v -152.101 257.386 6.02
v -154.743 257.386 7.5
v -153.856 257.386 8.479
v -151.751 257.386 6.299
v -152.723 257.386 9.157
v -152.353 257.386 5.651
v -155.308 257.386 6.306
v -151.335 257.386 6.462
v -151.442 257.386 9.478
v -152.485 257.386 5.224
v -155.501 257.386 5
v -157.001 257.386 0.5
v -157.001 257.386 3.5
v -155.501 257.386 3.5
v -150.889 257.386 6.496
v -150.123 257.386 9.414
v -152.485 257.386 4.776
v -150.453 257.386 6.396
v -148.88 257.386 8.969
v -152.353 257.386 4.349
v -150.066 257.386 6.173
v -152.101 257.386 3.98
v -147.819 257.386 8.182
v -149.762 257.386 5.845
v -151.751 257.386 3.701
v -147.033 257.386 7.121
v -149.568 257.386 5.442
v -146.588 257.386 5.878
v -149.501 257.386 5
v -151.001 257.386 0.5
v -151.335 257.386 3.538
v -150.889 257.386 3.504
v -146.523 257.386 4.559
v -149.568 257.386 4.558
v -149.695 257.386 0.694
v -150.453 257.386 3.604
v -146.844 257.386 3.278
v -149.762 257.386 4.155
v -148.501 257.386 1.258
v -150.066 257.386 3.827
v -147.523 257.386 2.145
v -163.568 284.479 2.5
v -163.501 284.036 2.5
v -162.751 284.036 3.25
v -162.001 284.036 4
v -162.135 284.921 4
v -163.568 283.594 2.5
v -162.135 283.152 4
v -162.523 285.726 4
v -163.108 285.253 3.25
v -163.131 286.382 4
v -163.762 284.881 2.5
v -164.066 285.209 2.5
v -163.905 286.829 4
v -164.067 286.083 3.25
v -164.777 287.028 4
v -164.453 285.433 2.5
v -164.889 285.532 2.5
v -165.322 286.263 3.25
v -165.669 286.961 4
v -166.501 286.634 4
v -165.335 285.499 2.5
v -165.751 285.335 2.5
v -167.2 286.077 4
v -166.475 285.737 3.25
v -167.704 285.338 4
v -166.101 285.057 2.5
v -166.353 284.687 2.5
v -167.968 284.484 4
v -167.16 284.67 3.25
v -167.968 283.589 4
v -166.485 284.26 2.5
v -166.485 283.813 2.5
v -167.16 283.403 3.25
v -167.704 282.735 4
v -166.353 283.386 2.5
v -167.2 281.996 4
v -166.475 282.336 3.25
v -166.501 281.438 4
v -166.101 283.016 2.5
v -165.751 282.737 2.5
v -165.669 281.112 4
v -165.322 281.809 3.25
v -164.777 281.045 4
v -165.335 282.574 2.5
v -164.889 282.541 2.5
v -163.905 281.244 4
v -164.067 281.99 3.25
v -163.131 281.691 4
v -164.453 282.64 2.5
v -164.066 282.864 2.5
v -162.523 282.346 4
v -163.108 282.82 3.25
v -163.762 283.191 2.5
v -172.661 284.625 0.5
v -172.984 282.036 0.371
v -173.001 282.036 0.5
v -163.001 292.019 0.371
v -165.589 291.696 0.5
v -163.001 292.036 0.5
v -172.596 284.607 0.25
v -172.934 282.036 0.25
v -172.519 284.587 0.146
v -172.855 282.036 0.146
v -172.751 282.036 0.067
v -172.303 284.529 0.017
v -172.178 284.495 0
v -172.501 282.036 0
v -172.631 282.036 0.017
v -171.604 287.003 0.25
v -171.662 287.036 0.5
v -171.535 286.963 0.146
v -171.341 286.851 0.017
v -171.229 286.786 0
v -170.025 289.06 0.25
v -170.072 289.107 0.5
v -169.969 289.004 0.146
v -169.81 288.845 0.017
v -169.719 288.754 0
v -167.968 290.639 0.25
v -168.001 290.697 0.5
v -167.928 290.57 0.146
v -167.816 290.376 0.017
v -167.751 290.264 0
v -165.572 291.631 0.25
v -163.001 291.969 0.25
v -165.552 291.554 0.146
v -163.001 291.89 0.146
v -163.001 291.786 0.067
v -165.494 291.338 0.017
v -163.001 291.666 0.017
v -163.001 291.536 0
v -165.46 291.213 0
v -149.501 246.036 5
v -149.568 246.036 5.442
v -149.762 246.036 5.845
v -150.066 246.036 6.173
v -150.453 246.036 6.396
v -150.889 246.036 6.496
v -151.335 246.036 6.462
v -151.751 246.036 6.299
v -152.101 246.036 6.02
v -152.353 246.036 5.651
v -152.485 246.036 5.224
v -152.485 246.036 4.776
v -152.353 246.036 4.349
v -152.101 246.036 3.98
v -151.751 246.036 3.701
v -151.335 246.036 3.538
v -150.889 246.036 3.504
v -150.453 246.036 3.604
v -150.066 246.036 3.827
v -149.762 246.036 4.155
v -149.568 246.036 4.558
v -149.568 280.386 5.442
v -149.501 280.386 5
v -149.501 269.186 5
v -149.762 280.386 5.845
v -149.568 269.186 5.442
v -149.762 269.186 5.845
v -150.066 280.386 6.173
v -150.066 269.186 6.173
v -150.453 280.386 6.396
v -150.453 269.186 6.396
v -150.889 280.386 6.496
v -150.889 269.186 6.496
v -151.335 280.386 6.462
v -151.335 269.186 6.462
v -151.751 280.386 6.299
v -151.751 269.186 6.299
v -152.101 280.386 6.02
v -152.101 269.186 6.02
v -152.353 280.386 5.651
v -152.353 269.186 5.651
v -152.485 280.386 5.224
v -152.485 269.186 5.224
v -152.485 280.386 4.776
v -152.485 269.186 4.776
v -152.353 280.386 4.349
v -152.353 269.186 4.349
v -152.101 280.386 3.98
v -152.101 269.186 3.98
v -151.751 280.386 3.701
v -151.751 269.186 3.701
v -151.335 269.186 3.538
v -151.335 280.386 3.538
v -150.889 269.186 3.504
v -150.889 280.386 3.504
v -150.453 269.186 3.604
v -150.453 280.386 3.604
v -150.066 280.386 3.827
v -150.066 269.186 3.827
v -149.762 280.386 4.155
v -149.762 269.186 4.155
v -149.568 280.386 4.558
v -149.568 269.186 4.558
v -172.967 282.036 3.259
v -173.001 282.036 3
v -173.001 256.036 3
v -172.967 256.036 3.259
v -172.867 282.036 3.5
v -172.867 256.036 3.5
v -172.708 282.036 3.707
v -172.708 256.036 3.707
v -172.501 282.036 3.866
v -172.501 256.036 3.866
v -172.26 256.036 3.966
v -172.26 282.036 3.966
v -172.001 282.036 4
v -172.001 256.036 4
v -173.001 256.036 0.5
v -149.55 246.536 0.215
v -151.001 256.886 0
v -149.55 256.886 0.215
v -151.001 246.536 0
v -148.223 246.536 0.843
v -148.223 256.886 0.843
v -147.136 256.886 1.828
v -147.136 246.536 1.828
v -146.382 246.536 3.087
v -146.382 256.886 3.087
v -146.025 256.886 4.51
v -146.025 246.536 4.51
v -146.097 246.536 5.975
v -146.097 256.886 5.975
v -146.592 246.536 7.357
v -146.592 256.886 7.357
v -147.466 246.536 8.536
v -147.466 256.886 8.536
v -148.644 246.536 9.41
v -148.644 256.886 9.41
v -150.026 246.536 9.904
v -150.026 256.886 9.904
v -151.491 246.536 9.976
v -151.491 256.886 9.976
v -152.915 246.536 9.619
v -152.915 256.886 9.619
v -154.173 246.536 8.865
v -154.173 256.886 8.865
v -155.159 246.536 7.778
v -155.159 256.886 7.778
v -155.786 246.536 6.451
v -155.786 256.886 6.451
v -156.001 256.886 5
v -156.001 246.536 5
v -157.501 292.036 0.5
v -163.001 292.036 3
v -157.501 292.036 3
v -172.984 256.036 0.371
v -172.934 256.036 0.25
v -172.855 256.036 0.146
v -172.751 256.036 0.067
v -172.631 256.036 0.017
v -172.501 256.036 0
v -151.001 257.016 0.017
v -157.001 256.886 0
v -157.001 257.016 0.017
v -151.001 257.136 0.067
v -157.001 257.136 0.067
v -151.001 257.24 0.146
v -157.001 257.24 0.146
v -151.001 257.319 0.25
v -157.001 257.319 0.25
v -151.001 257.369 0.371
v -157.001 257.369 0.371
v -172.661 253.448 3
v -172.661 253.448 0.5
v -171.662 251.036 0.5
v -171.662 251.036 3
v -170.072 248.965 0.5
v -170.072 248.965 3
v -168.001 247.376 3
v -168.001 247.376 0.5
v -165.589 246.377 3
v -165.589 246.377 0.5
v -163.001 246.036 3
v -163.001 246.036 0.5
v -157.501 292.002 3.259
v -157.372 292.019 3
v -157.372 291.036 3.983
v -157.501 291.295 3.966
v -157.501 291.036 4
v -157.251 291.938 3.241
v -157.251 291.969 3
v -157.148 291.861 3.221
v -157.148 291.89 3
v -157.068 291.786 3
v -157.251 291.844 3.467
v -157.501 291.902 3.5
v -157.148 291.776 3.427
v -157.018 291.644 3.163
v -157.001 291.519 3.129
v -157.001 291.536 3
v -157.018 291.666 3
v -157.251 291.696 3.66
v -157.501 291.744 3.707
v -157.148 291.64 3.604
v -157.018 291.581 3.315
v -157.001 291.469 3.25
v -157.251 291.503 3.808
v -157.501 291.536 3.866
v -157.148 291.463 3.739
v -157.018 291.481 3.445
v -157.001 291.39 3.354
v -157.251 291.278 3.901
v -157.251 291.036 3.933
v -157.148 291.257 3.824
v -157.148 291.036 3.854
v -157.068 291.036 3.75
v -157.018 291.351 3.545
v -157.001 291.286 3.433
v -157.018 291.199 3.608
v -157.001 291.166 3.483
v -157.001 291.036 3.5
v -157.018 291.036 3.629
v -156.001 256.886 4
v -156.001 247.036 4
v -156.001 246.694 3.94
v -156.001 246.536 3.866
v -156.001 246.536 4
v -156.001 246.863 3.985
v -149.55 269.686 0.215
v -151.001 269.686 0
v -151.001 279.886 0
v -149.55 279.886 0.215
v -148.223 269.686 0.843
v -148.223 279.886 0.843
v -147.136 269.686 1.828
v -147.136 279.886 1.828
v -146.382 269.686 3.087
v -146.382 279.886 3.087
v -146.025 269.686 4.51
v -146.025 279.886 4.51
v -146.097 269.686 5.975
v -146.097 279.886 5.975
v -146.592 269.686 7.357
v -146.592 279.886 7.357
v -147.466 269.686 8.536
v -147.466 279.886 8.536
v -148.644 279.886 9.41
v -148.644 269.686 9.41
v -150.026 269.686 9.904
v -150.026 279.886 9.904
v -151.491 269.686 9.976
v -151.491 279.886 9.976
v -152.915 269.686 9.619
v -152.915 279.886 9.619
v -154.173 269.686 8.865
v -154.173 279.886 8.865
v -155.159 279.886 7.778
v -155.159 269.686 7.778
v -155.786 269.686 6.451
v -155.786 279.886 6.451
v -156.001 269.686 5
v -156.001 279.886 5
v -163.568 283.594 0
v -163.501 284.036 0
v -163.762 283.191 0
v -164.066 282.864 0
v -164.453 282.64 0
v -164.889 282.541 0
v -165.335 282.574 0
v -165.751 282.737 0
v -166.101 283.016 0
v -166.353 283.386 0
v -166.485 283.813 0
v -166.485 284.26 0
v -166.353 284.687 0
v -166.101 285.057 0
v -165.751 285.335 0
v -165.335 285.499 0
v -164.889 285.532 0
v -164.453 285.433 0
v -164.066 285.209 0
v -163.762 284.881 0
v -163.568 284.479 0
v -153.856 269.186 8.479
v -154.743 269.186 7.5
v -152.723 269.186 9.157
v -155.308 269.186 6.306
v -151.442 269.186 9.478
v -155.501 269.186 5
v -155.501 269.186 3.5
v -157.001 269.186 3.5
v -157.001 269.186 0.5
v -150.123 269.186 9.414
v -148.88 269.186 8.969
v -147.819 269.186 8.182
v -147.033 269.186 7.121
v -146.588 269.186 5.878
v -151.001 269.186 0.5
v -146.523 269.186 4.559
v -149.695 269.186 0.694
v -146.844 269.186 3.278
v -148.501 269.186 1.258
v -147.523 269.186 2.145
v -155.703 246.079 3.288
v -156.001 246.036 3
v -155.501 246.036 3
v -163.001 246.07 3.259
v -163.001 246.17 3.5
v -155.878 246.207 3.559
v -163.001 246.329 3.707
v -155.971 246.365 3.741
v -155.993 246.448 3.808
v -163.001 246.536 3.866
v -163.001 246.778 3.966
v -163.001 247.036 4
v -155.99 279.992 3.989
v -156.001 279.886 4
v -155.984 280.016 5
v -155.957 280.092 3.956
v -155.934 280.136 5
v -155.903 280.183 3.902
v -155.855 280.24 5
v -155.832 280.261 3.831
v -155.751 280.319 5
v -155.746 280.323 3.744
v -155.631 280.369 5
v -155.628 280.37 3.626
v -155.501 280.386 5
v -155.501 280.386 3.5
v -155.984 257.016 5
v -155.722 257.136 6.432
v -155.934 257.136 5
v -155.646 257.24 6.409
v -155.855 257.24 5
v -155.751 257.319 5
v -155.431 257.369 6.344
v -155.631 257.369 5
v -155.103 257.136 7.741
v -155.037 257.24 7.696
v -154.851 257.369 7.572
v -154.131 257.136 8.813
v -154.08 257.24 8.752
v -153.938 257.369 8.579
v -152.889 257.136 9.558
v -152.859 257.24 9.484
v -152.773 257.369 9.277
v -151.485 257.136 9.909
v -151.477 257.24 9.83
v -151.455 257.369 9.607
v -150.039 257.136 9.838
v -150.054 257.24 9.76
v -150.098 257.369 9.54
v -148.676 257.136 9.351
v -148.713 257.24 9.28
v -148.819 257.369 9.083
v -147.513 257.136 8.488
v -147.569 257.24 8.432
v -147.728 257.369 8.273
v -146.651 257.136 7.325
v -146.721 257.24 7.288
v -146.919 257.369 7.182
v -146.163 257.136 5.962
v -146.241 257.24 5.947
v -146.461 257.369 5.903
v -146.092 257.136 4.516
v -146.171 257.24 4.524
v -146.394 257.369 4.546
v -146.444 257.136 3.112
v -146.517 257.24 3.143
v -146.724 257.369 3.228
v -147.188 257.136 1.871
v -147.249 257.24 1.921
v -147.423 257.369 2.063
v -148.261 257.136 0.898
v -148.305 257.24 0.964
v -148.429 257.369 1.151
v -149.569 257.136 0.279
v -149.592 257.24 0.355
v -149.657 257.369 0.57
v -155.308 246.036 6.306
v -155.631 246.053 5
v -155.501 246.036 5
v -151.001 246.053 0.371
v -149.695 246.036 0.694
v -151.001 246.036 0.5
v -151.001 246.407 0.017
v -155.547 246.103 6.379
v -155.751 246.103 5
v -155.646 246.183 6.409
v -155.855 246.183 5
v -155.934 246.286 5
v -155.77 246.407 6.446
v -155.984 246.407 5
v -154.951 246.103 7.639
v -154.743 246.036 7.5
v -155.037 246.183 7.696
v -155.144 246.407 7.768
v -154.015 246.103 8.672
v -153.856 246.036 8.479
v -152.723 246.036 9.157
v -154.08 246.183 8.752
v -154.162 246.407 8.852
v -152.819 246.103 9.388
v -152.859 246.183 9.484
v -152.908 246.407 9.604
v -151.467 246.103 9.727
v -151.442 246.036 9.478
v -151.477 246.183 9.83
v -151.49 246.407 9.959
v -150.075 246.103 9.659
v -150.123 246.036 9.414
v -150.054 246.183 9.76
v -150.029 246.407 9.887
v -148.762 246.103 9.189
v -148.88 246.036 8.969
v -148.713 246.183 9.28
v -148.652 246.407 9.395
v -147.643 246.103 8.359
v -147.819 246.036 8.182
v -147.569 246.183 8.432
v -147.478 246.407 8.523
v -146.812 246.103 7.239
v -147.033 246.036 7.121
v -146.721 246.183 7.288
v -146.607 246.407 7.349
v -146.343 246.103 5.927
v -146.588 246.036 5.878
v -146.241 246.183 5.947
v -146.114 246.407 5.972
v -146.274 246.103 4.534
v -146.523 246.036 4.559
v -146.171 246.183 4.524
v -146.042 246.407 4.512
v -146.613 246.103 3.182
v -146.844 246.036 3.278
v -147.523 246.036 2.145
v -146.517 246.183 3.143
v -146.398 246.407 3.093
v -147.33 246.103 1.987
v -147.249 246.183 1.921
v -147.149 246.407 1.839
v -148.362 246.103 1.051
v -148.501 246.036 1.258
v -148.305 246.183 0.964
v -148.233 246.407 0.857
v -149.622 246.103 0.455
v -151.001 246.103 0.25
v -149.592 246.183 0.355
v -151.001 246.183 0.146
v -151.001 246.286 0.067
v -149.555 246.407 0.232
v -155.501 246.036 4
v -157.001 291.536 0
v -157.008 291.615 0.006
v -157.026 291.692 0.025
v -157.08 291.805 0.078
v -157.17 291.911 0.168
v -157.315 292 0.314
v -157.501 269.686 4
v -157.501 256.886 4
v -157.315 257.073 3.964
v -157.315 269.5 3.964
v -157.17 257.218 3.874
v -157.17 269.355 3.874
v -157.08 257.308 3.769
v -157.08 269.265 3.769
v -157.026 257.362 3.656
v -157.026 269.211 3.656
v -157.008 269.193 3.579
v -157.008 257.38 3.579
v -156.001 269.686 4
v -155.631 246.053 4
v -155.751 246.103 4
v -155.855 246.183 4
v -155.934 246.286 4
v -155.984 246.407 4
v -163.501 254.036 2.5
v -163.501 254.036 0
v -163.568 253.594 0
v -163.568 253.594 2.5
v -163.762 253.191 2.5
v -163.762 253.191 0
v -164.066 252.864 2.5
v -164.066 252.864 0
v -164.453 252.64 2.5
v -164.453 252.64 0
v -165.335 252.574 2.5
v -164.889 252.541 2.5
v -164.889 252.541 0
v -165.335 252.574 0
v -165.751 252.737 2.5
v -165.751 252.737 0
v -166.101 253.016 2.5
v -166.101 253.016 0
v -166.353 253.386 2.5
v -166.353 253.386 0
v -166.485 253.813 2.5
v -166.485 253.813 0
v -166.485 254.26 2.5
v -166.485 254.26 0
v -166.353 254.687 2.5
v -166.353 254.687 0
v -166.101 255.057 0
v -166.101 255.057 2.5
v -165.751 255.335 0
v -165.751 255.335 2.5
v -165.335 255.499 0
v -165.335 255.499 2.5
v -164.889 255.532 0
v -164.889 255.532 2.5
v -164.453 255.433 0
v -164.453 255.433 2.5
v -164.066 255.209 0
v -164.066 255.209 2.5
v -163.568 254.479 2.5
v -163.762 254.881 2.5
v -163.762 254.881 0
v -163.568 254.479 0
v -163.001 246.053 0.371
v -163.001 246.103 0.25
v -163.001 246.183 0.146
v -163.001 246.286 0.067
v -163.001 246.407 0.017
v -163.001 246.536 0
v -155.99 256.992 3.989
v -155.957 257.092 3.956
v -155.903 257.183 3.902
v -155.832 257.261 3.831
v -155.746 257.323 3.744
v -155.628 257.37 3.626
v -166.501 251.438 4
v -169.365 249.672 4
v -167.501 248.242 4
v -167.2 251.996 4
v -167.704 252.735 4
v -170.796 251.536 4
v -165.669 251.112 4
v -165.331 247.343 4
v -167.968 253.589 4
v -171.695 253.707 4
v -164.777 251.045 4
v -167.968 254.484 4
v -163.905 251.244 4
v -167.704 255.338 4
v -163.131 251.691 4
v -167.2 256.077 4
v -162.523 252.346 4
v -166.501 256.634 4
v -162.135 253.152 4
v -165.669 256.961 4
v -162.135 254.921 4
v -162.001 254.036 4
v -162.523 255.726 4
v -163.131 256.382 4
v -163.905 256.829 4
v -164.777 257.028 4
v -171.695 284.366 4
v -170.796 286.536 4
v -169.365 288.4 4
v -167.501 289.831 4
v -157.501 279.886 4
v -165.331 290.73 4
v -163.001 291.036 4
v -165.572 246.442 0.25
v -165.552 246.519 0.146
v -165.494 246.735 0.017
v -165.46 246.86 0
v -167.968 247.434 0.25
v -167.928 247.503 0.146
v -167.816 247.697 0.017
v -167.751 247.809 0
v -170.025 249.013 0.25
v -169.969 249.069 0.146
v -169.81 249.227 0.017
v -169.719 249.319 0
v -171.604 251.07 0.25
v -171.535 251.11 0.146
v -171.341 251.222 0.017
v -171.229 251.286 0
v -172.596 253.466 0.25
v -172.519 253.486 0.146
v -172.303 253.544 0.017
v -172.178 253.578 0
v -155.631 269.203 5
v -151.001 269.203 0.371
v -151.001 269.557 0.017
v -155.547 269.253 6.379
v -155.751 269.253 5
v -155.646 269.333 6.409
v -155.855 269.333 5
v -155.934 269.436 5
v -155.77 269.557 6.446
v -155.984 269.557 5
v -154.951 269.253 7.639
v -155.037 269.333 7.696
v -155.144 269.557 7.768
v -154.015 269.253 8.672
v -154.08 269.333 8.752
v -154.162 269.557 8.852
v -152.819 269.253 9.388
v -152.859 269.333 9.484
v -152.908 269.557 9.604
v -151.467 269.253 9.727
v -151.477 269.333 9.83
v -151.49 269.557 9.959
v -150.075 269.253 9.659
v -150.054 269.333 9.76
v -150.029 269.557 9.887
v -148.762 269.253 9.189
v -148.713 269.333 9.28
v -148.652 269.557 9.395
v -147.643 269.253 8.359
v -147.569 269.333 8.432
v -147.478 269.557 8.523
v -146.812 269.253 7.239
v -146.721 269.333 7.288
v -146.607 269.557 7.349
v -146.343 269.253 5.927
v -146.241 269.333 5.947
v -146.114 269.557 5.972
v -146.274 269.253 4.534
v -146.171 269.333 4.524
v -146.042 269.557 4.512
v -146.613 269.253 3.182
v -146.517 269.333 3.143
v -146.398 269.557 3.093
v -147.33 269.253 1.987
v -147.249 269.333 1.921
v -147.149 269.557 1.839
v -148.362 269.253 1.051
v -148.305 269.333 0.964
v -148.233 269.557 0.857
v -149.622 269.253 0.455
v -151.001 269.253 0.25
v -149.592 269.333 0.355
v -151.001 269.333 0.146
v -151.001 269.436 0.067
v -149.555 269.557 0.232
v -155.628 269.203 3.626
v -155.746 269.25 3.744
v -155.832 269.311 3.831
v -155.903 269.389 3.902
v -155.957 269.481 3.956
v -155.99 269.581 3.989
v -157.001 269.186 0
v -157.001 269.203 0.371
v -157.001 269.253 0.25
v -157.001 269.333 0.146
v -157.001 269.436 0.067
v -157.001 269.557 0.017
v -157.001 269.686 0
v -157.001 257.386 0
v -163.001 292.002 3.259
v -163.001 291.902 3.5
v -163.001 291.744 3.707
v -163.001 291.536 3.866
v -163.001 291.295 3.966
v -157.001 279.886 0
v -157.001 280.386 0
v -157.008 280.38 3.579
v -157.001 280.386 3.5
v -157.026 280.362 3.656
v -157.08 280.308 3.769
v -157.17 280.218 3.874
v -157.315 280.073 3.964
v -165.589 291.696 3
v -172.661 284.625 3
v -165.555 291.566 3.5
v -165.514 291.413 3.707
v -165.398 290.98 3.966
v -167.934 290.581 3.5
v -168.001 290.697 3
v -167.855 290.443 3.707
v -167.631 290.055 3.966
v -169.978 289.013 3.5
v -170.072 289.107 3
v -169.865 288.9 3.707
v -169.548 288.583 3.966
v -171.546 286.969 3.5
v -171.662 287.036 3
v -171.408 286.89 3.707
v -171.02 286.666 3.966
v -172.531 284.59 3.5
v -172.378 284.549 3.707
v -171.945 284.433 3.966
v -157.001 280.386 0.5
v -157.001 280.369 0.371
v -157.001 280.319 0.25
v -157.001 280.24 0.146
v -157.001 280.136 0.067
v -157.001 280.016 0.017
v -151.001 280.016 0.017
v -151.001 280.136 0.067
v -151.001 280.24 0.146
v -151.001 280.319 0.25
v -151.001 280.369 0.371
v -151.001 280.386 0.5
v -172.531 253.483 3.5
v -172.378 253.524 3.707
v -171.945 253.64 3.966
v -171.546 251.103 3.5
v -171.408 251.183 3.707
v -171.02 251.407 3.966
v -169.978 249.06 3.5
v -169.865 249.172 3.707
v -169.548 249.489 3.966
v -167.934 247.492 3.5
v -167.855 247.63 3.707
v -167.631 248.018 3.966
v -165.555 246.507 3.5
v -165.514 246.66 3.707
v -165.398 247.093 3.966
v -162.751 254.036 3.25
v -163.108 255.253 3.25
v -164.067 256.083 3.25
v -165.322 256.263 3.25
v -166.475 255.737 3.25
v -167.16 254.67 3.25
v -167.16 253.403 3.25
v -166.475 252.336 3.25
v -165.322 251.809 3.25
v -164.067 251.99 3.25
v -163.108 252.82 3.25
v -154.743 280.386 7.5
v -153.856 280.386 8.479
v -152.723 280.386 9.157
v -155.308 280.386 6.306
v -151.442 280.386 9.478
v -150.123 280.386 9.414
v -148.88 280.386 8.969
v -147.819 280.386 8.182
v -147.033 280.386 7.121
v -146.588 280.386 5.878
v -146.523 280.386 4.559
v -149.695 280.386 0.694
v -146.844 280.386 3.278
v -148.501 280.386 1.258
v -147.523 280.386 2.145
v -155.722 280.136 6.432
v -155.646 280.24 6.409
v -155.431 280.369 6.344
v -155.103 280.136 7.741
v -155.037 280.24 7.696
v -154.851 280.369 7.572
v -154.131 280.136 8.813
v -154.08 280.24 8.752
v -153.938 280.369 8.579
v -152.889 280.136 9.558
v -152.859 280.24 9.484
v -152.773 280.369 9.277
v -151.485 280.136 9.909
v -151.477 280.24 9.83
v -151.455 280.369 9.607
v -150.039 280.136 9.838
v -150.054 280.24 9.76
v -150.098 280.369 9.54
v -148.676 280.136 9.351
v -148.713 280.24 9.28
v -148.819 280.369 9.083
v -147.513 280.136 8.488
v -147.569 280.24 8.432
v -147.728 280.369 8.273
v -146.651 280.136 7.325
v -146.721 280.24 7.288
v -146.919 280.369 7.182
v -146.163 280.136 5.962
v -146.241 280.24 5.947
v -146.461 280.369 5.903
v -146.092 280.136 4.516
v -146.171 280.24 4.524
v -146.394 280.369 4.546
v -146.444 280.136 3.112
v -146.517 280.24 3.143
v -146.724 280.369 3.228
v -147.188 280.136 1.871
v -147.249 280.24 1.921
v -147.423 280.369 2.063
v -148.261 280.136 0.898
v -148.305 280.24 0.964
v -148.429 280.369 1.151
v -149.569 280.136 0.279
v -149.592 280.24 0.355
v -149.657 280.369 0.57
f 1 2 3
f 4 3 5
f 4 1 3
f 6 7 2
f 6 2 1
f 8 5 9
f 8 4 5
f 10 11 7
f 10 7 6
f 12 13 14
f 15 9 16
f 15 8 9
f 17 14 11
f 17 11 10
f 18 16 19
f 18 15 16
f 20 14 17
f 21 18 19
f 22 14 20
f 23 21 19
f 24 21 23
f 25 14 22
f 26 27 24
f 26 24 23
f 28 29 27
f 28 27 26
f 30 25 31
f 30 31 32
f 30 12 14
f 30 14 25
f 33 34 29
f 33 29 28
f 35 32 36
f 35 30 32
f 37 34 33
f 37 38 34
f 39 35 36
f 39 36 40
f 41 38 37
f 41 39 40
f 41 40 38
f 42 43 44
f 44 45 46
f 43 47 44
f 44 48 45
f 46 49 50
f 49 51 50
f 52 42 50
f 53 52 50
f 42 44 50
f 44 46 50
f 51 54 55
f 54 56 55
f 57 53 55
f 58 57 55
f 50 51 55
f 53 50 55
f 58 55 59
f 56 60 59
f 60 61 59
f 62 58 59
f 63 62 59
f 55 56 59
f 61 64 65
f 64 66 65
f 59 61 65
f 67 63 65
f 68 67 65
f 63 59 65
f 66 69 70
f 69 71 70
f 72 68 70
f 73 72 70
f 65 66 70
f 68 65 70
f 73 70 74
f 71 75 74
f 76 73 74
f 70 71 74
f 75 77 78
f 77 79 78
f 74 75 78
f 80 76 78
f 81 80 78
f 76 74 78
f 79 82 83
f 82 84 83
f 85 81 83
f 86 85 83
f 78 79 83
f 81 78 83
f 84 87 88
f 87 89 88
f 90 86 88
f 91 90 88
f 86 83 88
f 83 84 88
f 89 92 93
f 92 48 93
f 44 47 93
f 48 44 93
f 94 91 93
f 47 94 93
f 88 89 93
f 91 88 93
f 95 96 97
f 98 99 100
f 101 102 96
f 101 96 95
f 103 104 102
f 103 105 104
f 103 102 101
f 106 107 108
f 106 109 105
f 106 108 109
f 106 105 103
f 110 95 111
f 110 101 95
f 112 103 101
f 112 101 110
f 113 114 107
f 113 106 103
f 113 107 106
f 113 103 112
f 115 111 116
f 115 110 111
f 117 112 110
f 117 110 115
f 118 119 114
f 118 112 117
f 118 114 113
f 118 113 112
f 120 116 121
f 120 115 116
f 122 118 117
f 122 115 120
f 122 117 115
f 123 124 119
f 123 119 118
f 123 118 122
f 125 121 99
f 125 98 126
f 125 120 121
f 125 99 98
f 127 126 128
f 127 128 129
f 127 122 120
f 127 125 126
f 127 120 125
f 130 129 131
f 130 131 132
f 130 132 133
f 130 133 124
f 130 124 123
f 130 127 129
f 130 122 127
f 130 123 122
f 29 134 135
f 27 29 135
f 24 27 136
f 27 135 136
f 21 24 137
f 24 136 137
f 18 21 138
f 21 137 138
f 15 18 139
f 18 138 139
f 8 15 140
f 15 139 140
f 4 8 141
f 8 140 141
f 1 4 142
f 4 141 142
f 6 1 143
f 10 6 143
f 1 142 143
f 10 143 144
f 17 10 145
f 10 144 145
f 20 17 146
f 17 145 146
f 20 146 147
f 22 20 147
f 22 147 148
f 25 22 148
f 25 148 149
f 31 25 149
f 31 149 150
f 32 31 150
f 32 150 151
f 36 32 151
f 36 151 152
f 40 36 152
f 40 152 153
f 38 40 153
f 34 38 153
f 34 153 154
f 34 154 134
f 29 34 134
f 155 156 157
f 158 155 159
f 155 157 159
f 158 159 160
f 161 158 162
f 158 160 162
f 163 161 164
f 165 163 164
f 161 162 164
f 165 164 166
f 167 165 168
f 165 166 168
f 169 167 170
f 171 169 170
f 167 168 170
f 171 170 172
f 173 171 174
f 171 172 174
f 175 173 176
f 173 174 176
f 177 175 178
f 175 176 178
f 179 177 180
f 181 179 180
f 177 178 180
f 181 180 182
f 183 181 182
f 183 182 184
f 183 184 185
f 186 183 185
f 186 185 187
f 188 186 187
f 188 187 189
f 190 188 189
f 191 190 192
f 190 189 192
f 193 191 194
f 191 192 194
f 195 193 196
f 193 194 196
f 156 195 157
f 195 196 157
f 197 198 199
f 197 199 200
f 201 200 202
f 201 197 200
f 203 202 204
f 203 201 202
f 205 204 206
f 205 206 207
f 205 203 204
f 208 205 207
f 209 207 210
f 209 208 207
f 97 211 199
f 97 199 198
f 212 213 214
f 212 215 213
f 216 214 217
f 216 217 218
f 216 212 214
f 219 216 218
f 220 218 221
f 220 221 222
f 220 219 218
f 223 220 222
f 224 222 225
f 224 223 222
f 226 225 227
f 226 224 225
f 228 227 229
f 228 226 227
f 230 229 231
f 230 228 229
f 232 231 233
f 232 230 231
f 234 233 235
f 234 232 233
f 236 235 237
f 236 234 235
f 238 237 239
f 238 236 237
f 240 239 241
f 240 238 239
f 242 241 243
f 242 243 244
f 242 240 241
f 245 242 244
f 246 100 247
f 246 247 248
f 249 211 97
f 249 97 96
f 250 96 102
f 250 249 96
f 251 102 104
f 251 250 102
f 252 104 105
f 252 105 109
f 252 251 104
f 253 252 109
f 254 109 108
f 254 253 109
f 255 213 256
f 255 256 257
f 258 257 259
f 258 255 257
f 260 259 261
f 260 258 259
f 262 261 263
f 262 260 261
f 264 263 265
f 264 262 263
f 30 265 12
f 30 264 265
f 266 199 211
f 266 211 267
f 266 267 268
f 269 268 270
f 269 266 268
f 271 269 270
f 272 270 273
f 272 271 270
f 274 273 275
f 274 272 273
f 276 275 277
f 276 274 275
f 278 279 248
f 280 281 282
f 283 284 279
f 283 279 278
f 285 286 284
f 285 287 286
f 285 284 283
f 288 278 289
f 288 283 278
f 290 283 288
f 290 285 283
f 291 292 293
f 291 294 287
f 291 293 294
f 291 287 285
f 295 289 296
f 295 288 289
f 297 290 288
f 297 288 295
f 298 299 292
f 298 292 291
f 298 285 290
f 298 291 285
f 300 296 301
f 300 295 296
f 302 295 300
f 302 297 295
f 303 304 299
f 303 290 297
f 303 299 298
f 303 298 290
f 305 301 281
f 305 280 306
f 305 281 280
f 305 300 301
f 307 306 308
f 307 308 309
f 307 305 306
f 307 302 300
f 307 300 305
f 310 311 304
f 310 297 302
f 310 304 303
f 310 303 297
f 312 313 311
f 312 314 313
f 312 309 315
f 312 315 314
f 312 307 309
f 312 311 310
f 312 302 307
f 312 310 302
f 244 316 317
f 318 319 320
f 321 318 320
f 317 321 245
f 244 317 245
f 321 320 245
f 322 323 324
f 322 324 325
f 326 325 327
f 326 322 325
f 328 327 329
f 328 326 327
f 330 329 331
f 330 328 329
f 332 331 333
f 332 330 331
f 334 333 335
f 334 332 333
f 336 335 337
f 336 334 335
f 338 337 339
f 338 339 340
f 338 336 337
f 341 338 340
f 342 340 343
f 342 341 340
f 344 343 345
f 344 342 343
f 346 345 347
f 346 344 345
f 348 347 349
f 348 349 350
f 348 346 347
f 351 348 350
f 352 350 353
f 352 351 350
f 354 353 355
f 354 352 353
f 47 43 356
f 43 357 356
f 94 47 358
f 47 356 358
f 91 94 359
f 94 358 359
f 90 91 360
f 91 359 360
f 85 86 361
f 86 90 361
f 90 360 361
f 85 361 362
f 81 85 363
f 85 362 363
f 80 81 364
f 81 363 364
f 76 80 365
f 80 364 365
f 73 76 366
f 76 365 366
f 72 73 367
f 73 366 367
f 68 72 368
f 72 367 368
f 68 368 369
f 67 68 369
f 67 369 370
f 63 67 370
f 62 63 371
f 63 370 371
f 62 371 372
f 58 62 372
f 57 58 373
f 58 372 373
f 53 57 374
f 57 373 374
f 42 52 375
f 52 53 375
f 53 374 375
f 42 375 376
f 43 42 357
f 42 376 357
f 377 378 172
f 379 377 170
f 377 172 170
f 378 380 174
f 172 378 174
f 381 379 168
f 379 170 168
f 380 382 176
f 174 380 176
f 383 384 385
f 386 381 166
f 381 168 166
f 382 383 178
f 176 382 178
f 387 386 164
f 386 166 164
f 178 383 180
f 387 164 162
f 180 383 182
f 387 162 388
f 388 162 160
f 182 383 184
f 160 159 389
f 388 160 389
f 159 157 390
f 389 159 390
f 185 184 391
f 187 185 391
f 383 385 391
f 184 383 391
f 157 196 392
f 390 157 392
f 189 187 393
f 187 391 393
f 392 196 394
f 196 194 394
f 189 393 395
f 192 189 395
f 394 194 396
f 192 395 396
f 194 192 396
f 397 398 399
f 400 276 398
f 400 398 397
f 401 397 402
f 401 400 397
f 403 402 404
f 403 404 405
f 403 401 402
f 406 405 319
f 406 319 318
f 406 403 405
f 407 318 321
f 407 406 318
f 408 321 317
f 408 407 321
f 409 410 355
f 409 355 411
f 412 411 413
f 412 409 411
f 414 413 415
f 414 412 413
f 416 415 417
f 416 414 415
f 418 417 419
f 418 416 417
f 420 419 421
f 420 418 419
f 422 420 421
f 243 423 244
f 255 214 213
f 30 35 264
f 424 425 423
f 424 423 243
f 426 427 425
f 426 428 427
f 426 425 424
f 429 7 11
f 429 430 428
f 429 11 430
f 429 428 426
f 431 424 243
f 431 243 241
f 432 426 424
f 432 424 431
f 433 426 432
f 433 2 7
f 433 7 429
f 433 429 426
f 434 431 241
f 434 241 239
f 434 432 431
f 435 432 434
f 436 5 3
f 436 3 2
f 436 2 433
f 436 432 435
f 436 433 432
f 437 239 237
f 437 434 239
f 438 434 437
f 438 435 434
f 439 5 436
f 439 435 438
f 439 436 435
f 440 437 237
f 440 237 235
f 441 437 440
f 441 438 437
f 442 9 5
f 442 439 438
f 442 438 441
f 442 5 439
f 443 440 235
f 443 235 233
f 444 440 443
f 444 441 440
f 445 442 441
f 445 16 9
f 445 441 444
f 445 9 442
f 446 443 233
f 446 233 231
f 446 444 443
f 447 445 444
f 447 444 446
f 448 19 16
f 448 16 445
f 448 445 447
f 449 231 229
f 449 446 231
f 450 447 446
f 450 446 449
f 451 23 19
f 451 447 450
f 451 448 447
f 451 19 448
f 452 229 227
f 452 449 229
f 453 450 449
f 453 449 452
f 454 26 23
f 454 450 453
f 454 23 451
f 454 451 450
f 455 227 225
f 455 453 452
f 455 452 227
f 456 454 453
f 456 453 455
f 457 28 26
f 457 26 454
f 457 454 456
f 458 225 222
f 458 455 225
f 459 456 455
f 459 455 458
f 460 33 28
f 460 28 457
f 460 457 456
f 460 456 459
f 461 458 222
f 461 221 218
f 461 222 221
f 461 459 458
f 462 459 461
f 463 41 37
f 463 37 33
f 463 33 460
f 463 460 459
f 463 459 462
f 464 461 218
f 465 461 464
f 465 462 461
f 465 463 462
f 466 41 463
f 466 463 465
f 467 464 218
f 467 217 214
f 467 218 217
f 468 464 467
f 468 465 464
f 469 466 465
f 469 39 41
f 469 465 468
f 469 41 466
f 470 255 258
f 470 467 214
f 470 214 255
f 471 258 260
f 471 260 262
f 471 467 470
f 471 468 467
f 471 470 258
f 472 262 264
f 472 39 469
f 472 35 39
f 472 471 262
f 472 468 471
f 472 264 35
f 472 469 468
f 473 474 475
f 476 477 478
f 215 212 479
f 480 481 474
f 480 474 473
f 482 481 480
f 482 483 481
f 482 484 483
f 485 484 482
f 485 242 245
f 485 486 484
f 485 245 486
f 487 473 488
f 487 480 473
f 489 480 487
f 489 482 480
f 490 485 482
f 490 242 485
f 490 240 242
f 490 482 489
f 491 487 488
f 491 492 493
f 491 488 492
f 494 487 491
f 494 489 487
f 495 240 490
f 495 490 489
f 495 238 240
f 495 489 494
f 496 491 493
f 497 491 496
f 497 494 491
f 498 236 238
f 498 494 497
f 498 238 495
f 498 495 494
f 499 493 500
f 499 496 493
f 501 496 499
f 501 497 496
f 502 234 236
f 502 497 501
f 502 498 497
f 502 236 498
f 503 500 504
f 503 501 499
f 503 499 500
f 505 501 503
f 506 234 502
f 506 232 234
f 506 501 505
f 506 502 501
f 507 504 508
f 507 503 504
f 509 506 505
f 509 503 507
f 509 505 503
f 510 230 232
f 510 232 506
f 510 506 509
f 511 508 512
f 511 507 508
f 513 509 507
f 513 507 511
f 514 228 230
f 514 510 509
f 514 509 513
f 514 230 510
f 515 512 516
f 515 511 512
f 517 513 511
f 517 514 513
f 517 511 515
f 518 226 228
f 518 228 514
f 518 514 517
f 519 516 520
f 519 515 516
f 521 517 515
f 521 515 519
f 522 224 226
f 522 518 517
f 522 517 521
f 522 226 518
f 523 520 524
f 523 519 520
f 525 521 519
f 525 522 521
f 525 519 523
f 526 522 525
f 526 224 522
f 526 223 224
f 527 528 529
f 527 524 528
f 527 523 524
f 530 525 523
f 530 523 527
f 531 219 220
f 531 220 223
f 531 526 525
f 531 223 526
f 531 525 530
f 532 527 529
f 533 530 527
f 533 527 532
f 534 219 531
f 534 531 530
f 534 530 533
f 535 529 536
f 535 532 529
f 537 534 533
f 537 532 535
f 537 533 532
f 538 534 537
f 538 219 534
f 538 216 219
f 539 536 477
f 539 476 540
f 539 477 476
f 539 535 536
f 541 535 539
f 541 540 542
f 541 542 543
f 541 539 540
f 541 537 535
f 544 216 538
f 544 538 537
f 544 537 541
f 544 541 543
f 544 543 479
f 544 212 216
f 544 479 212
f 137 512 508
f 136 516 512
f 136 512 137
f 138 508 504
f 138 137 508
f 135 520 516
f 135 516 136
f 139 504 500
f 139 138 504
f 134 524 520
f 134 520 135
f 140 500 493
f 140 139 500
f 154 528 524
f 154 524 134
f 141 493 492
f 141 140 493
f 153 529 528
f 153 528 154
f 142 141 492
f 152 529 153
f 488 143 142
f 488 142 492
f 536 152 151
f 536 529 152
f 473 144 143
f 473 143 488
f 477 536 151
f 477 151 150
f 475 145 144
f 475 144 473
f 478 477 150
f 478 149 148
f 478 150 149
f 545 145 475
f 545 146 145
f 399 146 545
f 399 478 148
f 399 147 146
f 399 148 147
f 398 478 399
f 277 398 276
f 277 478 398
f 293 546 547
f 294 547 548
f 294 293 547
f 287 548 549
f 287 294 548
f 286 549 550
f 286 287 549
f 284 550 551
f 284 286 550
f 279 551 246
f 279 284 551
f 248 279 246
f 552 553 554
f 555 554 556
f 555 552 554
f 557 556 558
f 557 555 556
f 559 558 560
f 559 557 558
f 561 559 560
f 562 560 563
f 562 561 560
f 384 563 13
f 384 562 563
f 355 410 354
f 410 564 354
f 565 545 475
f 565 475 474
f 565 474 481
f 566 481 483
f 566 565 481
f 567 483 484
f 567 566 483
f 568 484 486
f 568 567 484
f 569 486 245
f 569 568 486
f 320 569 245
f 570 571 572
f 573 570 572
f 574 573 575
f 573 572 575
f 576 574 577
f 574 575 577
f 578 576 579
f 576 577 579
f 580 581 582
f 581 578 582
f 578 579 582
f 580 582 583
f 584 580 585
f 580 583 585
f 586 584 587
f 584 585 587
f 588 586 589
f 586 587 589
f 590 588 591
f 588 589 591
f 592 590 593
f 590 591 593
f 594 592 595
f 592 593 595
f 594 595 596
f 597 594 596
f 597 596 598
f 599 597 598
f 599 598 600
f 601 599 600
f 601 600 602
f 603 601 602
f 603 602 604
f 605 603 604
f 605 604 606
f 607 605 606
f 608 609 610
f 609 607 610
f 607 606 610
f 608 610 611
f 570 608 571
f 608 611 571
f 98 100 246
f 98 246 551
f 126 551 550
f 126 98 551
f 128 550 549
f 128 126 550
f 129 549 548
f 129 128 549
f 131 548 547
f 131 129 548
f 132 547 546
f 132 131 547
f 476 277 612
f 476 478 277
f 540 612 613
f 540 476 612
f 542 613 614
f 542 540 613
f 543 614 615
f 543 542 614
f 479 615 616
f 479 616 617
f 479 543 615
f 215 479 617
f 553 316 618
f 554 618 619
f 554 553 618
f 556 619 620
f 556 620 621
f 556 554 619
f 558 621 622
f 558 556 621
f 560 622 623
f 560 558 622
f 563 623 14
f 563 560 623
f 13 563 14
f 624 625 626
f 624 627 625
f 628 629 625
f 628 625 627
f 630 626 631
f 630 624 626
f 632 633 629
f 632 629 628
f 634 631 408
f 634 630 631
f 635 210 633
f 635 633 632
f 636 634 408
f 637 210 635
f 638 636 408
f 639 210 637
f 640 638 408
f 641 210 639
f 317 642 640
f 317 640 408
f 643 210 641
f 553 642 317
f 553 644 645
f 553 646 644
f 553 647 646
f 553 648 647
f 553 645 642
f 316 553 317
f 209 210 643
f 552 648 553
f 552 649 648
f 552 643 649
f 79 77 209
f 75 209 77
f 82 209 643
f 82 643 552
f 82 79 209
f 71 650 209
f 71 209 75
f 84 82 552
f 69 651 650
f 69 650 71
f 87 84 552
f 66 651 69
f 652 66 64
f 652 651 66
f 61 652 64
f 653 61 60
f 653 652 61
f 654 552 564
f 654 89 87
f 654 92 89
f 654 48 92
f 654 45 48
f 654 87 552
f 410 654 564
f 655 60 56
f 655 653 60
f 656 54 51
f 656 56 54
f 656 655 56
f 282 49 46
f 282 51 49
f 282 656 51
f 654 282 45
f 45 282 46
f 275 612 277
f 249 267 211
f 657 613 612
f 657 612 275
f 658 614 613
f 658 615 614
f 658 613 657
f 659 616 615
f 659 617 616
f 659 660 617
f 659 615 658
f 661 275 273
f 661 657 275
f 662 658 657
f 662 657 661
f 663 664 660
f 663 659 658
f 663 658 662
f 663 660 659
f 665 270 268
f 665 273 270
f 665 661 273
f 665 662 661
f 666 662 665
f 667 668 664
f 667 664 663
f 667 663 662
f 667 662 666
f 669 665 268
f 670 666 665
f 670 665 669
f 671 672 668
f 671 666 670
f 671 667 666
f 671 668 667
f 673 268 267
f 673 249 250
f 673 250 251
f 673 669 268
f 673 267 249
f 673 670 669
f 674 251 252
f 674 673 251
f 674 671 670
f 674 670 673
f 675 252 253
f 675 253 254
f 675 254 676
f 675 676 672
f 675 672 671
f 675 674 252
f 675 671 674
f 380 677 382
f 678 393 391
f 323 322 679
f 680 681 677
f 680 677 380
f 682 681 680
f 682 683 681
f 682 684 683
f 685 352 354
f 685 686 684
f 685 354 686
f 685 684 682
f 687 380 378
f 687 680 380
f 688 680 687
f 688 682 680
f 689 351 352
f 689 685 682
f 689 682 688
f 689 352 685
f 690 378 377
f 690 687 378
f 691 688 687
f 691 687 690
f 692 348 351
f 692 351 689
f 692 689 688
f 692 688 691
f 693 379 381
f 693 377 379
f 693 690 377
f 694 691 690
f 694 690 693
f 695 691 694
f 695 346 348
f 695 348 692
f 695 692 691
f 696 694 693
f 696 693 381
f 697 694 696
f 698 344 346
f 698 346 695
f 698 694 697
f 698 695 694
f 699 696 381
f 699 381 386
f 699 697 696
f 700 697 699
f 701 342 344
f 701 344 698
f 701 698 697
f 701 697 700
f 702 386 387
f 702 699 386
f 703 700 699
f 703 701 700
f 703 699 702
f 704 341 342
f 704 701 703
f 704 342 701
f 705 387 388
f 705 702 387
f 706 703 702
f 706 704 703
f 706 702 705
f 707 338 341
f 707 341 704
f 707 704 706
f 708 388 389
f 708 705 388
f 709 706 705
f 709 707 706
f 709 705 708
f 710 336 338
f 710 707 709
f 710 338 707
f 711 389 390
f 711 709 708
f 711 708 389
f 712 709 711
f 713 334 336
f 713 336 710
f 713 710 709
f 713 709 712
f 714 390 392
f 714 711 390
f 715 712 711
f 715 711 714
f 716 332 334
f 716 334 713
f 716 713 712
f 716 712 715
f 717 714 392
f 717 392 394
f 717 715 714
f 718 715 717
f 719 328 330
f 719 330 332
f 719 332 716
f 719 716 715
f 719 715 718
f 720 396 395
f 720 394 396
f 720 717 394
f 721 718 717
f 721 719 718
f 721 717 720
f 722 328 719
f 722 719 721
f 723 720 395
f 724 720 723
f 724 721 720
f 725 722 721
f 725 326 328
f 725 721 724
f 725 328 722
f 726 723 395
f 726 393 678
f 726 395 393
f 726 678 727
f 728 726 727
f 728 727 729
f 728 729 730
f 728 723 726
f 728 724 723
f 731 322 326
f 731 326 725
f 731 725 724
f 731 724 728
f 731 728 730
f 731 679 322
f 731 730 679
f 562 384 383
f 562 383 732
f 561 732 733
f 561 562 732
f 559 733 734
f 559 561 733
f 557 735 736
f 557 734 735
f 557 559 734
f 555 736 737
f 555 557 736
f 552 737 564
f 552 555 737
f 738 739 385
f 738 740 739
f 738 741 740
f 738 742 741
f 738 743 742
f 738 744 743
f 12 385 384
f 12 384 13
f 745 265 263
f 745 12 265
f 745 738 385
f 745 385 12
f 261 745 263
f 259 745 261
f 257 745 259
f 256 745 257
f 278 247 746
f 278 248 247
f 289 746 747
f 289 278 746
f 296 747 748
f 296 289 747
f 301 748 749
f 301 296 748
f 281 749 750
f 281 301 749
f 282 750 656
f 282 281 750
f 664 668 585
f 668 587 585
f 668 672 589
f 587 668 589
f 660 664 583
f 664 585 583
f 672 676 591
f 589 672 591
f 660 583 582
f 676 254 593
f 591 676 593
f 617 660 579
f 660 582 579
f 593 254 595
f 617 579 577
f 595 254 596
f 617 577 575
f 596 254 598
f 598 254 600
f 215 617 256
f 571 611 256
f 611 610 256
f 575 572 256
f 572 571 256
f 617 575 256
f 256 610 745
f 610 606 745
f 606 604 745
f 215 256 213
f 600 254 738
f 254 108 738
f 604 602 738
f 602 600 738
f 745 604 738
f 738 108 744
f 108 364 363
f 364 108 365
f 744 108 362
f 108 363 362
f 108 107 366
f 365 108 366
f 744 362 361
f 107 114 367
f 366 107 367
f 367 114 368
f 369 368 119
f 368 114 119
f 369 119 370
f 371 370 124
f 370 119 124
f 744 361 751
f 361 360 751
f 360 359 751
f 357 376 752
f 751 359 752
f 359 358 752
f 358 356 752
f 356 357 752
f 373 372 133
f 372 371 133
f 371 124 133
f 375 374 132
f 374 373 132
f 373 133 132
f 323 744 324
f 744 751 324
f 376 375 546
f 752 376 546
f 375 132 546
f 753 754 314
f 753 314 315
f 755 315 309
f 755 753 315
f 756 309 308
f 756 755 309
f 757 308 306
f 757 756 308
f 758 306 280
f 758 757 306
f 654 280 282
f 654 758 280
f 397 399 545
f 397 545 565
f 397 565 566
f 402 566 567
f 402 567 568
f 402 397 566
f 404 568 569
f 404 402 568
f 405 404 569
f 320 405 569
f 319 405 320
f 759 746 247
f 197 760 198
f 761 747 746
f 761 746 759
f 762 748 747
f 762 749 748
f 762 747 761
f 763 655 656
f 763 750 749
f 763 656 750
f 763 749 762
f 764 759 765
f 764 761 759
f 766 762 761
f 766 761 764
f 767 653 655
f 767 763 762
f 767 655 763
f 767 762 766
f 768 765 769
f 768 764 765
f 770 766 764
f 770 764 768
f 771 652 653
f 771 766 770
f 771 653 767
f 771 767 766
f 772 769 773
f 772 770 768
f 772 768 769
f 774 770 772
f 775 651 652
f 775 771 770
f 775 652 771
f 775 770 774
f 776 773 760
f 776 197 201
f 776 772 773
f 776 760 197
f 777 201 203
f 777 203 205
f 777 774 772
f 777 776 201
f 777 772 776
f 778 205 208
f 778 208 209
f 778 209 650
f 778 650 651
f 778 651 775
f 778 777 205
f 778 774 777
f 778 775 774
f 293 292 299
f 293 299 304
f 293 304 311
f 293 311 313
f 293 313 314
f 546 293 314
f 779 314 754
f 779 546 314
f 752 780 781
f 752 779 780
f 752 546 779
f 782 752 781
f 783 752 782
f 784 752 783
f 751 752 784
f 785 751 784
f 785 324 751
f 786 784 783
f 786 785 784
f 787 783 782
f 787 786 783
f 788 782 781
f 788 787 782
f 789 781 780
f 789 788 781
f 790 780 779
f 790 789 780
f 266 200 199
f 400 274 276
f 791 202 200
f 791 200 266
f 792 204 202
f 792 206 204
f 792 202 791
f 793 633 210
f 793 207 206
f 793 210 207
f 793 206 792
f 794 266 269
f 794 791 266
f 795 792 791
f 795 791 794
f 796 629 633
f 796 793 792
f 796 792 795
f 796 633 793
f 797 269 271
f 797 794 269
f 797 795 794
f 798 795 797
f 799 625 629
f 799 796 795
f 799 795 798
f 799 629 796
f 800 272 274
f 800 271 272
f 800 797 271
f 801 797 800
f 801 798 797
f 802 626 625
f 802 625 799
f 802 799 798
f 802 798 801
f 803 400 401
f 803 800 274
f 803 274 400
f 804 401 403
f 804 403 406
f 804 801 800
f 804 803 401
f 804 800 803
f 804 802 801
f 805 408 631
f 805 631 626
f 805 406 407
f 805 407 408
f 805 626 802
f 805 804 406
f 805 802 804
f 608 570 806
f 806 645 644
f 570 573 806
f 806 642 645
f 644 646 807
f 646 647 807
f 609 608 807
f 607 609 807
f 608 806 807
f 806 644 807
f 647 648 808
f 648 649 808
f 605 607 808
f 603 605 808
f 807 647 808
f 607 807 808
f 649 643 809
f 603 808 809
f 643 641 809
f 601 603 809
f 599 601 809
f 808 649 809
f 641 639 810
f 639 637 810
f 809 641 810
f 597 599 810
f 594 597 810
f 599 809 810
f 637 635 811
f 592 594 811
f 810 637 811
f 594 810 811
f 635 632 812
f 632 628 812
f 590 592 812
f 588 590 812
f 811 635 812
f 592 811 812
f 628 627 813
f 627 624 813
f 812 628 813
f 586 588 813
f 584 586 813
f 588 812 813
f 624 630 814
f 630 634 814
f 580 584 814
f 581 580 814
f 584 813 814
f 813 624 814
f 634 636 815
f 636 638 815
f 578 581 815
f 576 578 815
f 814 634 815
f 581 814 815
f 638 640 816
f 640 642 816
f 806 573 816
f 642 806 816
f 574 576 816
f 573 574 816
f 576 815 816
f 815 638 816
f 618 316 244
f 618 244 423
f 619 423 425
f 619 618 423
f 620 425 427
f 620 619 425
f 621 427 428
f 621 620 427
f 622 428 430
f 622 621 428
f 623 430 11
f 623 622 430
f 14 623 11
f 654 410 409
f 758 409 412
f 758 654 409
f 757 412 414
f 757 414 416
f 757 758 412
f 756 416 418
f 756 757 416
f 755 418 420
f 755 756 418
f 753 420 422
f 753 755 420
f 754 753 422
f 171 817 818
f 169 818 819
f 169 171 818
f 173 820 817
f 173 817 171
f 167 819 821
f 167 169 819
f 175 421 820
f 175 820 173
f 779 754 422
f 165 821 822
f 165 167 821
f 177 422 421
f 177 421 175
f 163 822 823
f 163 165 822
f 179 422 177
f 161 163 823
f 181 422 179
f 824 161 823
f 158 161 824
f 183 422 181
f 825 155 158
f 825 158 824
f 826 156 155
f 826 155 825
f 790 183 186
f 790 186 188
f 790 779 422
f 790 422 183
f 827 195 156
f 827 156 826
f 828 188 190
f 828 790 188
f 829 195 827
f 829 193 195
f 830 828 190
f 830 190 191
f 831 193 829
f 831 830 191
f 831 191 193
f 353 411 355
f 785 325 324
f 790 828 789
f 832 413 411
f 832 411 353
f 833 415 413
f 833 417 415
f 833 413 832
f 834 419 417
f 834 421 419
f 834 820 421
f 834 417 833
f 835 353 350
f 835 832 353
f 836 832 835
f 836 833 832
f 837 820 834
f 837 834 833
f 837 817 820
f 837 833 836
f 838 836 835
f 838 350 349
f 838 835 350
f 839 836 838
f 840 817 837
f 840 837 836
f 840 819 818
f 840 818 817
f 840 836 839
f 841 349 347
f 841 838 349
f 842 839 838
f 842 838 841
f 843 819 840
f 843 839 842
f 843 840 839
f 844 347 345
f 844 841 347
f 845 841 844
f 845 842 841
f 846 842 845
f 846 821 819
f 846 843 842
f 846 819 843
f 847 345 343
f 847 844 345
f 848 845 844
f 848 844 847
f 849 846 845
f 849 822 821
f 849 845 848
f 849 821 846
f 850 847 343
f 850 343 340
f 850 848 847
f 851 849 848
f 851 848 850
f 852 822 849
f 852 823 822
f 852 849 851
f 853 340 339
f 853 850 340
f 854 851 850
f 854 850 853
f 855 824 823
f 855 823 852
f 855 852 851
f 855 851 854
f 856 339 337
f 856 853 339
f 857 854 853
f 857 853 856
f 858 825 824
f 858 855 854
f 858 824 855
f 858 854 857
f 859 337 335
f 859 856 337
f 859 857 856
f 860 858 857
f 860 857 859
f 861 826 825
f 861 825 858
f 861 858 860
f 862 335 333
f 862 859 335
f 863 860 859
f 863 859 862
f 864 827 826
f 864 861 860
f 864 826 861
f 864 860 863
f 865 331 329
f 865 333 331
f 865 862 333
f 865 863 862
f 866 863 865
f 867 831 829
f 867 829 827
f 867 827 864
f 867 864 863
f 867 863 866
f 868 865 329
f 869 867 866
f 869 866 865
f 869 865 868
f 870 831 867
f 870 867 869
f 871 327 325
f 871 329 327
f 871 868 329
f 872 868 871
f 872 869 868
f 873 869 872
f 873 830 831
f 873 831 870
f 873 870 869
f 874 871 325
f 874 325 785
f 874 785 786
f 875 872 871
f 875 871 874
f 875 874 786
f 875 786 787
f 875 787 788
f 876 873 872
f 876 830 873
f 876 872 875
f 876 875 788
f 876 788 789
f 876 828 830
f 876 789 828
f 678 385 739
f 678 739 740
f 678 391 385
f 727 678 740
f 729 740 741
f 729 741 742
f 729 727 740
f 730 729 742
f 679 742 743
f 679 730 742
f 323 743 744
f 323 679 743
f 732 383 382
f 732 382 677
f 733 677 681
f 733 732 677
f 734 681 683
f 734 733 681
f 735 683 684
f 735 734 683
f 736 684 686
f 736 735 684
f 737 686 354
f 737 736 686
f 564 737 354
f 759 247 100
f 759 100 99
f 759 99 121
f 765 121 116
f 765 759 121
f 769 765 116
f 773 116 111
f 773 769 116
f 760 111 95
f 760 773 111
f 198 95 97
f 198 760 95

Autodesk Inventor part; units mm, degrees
ref_plane "YZ Plane" through (0, 0, 0) normal (1, 0, 0) x (0, 1, 0)
ref_plane "XZ Plane" through (0, 0, 0) normal (0, 1, 0) x (-1, 0, 0)
ref_plane "XY Plane" through (0, 0, 0) normal (0, 0, 1) x (1, 0, 0)
sketch "Эскиз1" plane through (0, 0, 0) normal (0, 0, 1) x (1, 0, 0)
  line L0 (-173.0013, 292.0364) -> (-157.0013, 292.0364)
  line L1 (-157.0013, 292.0364) -> (-157.0013, 246.0364)
  line L2 (-157.0013, 246.0364) -> (-173.0013, 246.0364)
  line L3 (-173.0013, 246.0364) -> (-173.0013, 292.0364)
  circle A0 centre (-165.0013, 284.0364) radius 1.5
  circle A1 centre (-165.0013, 254.0364) radius 1.5
  line L4 (-165.0013, 284.0364) -> (-165.0013, 254.0364) construction
  line L5 (-157.0013, 292.0364) -> (-145.0013, 292.0364)
  line L6 (-145.0013, 292.0364) -> (-145.0013, 280.5364)
  line L7 (-145.0013, 280.5364) -> (-157.0013, 280.5364) construction
  line L8 (-157.0013, 280.5364) -> (-157.0013, 292.0364)
  line L9 (-157.0013, 269.0364) -> (-145.0013, 269.0364) construction
  line L10 (-145.0013, 269.0364) -> (-145.0013, 257.5364)
  line L11 (-145.0013, 257.5364) -> (-157.0013, 257.5364) construction
  line L12 (-157.0013, 257.5364) -> (-157.0013, 269.0364)
  line L13 (-145.0013, 292.0364) -> (-129.0013, 292.0364)
  line L14 (-129.0013, 292.0364) -> (-129.0013, 246.0364)
  line L15 (-129.0013, 246.0364) -> (-145.0013, 246.0364)
  line L16 (-145.0013, 246.0364) -> (-145.0013, 292.0364)
  line L17 (-145.0013, 254.7807) -> (-145.0013, 246.0364)
  line L18 (-145.0013, 246.0364) -> (-157.0013, 246.0364)
  line L19 (-157.0013, 246.0364) -> (-157.0013, 254.7807)
  line L20 (-157.0013, 280.3864) -> (-145.0013, 280.3864)
  line L21 (-157.0013, 269.1864) -> (-145.0013, 269.1864)
  line L22 (-157.0013, 257.3864) -> (-145.0013, 257.3864)
  point P0 (0, 0)
  dimension "d0" = 3
  dimension "d1" = 3
  dimension "d2" = 8
  dimension "d3" = 8
  dimension "d4" = 30
  dimension "d5" = 46
  dimension "d6" = 8
  dimension "d7" = 8
  dimension "d8" = 46
  dimension "d9" = 16
  dimension "d10" = 44
  dimension "d11" = 12
  dimension "d12" = 16
  dimension "d13" = 11.5
  dimension "d14" = 11.5
  dimension "d15" = 11.5
  dimension "d16" = 11.5
  dimension "d17" = 0.15
  dimension "d18" = 0.15
  dimension "d19" = 0.15
extrude "Выдавливание1" add sketch "Эскиз1" along normal blind 4 contours L0 L1 L2 L3
extrude "Выдавливание2" add sketch "Эскиз1" along normal blind 10 contours L1 L22 L16 L18 | L20 L16 L21 L1
sketch "Эскиз2" plane through (-173.0013, 246.0364, 0) normal (0, -1, 0) x (1, 0, 0)
  line L0 (28, 0) -> (16, 0) projected
  line L1 (22, 0) -> (22, 10) construction
  circle A0 centre (22, 5) radius 1.5
  line L2 (16, 10) -> (28, 10) projected
  circle A1 centre (22, 5) radius 5
  line L3 (28, 10) -> (16, 10) projected
  line L4 (22, 10) -> (28, 10)
  line L5 (28, 0) -> (28, 10) projected
  line L6 (28, 10) -> (28, 0)
  line L7 (28, 0) -> (22, 0)
  line L8 (16, 0) -> (28, 0) projected
  arc A2 (22, 0) -> (22, 10) centre (22, 5) ccw
  line L9 (0, 4) -> (16, 4) projected
  line L10 (16, 4) -> (17, 4)
  line L11 (17, 4) -> (17, 5)
  line L12 (16, 4) -> (16, 10) projected
  line L13 (16, 4) -> (16, 10)
  arc A3 (22, 10) -> (17, 5) centre (22, 5) ccw
  line L14 (16, 10) -> (22, 10)
  line L15 (16, 10) -> (28, 10) projected
  point P0 (173.0013, 0)
  dimension "d24" = 3
extrude "Выдавливание3" cut sketch "Эскиз2" against normal blind 50 contours L0 A1 L2 L5 | L11 L10 L12 L2 A1
extrude "Выдавливание4" cut sketch "Эскиз2" against normal blind 50 contours A0
fillet "Сопряжение1" radius 10 2 edges at (-173.0013, 292.0364, 2) (-173.0013, 246.0364, 2)
fillet "Сопряжение2" radius 1 5 edges at (-160.0013, 292.0364, 4) (-173.0013, 269.0364, 4) (-170.0724, 248.9654, 4) (-159.5013, 246.0364, 4) (-170.0724, 289.1075, 4)
fillet "Сопряжение3" radius 0.5 24 edges at (-157.0013, 291.7435, 3.7071) (-157.0013, 292.0364, 1.5) (-157.0013, 285.7114, 4) (-154.0013, 280.3864, 0) (-156.0013, 280.3864, 4.5) (-147.4658, 280.3864, 8.5355) (-156.5013, 269.1864, 4) (-156.0013, 269.1864, 4.5) (-154.0013, 269.1864, 0) (-147.4658, 269.1864, 8.5355) (-157.0013, 263.2864, 4) (-156.5013, 257.3864, 4) (-154.0013, 257.3864, 0) (-156.0013, 257.3864, 4.5) (-147.4658, 257.3864, 8.5355) (-156.0013, 246.0364, 3.5) (-156.0013, 246.0364, 4.5) (-157.0013, 246.0364, 0) (-170.0724, 248.9654, 0) (-173.0013, 269.0364, 0) (-170.0724, 289.1075, 0) (-160.0013, 292.0364, 0) (-147.4658, 246.0364, 8.5355) (-156.5013, 280.3864, 4)
chamfer "Фаска1" distance 1.5 angle 45 2 edges at (-166.5013, 254.0364, 4) (-166.5013, 284.0364, 4)
properties part number "петля"
